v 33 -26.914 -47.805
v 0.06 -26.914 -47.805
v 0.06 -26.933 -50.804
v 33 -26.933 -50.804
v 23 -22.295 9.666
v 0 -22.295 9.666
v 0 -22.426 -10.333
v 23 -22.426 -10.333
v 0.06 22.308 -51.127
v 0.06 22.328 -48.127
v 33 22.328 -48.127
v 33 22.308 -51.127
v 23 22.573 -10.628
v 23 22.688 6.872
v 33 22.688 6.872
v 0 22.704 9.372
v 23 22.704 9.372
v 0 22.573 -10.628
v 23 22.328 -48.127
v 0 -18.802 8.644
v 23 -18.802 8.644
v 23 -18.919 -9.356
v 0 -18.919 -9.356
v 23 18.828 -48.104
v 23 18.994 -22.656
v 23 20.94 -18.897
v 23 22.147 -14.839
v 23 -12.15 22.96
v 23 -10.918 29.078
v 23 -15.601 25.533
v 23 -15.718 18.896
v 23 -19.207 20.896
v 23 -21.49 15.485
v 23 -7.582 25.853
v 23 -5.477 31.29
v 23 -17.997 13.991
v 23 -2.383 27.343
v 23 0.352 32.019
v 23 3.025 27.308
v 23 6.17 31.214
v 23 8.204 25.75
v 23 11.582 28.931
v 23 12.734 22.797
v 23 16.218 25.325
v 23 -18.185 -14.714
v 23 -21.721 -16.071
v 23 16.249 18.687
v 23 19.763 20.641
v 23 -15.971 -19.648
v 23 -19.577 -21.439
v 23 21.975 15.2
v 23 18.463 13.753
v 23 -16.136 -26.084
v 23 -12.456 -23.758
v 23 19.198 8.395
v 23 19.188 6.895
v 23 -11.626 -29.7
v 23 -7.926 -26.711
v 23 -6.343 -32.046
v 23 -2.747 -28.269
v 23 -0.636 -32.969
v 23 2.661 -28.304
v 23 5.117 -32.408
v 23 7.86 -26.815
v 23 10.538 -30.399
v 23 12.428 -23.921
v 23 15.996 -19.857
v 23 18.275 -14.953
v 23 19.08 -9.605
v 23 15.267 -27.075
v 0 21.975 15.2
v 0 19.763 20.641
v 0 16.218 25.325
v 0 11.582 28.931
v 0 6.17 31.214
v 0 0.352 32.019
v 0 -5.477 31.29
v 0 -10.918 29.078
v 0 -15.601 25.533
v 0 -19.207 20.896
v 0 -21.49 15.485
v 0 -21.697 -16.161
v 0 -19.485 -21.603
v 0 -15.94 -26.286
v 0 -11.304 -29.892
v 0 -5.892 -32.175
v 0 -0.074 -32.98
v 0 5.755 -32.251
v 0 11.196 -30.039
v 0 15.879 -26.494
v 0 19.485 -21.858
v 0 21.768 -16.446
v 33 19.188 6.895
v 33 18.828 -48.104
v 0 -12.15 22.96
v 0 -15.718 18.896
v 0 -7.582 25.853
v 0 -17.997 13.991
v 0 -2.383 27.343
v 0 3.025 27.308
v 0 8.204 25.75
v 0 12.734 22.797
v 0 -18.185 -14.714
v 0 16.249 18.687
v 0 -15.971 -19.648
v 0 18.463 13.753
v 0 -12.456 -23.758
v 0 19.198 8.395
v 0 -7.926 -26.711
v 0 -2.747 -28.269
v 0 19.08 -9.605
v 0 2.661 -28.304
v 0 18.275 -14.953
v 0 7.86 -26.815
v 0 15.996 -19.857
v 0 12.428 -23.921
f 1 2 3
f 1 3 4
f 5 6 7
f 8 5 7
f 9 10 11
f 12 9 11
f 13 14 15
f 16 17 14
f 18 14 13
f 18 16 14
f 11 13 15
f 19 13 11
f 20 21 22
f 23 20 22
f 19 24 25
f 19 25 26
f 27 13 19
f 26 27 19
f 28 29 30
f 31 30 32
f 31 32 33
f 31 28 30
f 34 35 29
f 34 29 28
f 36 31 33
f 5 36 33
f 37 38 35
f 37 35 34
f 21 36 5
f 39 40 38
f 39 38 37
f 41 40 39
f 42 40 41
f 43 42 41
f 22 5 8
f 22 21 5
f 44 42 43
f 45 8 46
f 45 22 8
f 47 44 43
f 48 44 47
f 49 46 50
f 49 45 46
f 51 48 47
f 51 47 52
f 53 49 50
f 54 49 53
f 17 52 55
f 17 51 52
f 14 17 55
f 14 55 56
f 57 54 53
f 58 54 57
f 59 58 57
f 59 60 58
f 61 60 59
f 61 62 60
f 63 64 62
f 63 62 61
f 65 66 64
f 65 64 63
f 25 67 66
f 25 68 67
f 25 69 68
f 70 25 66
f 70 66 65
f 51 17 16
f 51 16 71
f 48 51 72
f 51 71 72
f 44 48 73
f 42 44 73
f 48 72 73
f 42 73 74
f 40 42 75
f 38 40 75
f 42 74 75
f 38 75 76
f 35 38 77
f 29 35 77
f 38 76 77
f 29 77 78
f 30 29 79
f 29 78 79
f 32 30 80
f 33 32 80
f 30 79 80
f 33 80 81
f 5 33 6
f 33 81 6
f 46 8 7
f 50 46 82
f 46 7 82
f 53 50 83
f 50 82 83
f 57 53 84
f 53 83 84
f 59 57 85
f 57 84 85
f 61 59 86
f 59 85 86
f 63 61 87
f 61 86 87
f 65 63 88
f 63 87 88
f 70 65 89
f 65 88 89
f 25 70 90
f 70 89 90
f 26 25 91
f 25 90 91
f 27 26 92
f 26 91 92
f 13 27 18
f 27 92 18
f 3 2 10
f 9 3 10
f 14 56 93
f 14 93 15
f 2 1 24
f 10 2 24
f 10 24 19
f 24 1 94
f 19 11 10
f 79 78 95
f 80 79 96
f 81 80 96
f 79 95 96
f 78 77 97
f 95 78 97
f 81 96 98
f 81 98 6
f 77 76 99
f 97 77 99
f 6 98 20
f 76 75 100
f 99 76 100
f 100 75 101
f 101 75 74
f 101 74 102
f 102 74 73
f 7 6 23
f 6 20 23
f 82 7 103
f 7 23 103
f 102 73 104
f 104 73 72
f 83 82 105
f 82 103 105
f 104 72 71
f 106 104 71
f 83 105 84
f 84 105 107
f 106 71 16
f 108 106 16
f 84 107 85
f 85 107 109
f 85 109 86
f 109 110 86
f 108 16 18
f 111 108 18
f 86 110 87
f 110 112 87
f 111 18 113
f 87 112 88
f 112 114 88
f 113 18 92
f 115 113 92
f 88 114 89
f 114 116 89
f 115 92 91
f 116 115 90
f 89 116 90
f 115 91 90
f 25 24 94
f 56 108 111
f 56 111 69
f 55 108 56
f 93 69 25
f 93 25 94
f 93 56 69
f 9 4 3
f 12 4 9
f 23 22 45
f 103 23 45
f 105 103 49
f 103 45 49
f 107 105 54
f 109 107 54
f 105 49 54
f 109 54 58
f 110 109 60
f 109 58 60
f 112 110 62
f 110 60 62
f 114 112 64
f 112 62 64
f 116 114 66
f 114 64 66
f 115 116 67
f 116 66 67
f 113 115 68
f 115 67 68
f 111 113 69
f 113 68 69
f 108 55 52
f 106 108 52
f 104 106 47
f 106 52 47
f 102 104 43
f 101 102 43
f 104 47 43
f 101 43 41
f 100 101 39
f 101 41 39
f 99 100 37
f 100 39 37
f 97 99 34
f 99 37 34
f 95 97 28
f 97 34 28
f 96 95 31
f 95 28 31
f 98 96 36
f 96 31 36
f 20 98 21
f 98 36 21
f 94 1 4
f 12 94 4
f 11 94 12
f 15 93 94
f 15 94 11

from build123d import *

# Parameters (mm, degrees)
PAD_DEPTH            = 23
POCKET_DEPTH         = 25
SKETCH002_W          = 15
SKETCH002_H          = 3.5
PAD001_DEPTH         = 10
SKETCH003_W          = 3.5
SKETCH003_H          = 10
PAD002_DEPTH         = 40
SKETCH004_W          = 49.242171
SKETCH004_H          = 32.94012
PAD003_DEPTH         = 3
BODY_PLACEMENT_ANGLE = 90.375075


with BuildPart() as part:
    # Sketch → Pad (new body)
    with BuildSketch(Plane.YZ):
        with BuildLine():
            ThreePointArc((-10, 22.5), (-32.5, 0), (-10, -22.5))
            Line((-10, -22.5), (10, -22.5))
            ThreePointArc((10, -22.5), (32.5, 0), (10, 22.5))
            Line((-10, 22.5), (10, 22.5))
        make_face()
    extrude(amount=PAD_DEPTH)

    # Sketch001 (on Face6 of Pad) → Pocket (cut)
    with BuildSketch(Plane.YZ.offset(23)):
        with BuildLine():
            ThreePointArc((-9, 19), (-28, 0), (-9, -19))
            Line((-9, -19), (9, -19))
            ThreePointArc((9, -19), (28, 0), (9, 19))
            Line((-9, 19), (9, 19))
        make_face()
    extrude(amount=-POCKET_DEPTH, mode=Mode.SUBTRACT)

    # Sketch002 (on Face5 of Pocket) → Pad001 (join)
    with BuildSketch(Plane.YZ.offset(23)):
        with Locations((0, 20.75)):
            Rectangle(SKETCH002_W, SKETCH002_H)
    extrude(amount=PAD001_DEPTH)

    # Sketch003 (on Face13 of Pad001) → Pad002 (join)
    with BuildSketch(Plane.ZX.offset(7.5)):
        with Locations((20.75, 28)):
            Rectangle(SKETCH003_W, SKETCH003_H)
    extrude(amount=PAD002_DEPTH)

    # Sketch004 (on Face18 of Pad002) → Pad003 (join)
    with BuildSketch(Plane.ZX.offset(47.5)):
        with Locations((-2.121085, 16.52994)):
            Rectangle(SKETCH004_W, SKETCH004_H)
    extrude(amount=PAD003_DEPTH)


with BuildPart() as part_1:
    # Body placement: moved
    add(part.part.moved(Location((0, 0.13901, -0.480614))).rotate(Axis((0, 0.13901, -0.480614), (-1, 0, 0)), BODY_PLACEMENT_ANGLE))


solid = part_1.part
